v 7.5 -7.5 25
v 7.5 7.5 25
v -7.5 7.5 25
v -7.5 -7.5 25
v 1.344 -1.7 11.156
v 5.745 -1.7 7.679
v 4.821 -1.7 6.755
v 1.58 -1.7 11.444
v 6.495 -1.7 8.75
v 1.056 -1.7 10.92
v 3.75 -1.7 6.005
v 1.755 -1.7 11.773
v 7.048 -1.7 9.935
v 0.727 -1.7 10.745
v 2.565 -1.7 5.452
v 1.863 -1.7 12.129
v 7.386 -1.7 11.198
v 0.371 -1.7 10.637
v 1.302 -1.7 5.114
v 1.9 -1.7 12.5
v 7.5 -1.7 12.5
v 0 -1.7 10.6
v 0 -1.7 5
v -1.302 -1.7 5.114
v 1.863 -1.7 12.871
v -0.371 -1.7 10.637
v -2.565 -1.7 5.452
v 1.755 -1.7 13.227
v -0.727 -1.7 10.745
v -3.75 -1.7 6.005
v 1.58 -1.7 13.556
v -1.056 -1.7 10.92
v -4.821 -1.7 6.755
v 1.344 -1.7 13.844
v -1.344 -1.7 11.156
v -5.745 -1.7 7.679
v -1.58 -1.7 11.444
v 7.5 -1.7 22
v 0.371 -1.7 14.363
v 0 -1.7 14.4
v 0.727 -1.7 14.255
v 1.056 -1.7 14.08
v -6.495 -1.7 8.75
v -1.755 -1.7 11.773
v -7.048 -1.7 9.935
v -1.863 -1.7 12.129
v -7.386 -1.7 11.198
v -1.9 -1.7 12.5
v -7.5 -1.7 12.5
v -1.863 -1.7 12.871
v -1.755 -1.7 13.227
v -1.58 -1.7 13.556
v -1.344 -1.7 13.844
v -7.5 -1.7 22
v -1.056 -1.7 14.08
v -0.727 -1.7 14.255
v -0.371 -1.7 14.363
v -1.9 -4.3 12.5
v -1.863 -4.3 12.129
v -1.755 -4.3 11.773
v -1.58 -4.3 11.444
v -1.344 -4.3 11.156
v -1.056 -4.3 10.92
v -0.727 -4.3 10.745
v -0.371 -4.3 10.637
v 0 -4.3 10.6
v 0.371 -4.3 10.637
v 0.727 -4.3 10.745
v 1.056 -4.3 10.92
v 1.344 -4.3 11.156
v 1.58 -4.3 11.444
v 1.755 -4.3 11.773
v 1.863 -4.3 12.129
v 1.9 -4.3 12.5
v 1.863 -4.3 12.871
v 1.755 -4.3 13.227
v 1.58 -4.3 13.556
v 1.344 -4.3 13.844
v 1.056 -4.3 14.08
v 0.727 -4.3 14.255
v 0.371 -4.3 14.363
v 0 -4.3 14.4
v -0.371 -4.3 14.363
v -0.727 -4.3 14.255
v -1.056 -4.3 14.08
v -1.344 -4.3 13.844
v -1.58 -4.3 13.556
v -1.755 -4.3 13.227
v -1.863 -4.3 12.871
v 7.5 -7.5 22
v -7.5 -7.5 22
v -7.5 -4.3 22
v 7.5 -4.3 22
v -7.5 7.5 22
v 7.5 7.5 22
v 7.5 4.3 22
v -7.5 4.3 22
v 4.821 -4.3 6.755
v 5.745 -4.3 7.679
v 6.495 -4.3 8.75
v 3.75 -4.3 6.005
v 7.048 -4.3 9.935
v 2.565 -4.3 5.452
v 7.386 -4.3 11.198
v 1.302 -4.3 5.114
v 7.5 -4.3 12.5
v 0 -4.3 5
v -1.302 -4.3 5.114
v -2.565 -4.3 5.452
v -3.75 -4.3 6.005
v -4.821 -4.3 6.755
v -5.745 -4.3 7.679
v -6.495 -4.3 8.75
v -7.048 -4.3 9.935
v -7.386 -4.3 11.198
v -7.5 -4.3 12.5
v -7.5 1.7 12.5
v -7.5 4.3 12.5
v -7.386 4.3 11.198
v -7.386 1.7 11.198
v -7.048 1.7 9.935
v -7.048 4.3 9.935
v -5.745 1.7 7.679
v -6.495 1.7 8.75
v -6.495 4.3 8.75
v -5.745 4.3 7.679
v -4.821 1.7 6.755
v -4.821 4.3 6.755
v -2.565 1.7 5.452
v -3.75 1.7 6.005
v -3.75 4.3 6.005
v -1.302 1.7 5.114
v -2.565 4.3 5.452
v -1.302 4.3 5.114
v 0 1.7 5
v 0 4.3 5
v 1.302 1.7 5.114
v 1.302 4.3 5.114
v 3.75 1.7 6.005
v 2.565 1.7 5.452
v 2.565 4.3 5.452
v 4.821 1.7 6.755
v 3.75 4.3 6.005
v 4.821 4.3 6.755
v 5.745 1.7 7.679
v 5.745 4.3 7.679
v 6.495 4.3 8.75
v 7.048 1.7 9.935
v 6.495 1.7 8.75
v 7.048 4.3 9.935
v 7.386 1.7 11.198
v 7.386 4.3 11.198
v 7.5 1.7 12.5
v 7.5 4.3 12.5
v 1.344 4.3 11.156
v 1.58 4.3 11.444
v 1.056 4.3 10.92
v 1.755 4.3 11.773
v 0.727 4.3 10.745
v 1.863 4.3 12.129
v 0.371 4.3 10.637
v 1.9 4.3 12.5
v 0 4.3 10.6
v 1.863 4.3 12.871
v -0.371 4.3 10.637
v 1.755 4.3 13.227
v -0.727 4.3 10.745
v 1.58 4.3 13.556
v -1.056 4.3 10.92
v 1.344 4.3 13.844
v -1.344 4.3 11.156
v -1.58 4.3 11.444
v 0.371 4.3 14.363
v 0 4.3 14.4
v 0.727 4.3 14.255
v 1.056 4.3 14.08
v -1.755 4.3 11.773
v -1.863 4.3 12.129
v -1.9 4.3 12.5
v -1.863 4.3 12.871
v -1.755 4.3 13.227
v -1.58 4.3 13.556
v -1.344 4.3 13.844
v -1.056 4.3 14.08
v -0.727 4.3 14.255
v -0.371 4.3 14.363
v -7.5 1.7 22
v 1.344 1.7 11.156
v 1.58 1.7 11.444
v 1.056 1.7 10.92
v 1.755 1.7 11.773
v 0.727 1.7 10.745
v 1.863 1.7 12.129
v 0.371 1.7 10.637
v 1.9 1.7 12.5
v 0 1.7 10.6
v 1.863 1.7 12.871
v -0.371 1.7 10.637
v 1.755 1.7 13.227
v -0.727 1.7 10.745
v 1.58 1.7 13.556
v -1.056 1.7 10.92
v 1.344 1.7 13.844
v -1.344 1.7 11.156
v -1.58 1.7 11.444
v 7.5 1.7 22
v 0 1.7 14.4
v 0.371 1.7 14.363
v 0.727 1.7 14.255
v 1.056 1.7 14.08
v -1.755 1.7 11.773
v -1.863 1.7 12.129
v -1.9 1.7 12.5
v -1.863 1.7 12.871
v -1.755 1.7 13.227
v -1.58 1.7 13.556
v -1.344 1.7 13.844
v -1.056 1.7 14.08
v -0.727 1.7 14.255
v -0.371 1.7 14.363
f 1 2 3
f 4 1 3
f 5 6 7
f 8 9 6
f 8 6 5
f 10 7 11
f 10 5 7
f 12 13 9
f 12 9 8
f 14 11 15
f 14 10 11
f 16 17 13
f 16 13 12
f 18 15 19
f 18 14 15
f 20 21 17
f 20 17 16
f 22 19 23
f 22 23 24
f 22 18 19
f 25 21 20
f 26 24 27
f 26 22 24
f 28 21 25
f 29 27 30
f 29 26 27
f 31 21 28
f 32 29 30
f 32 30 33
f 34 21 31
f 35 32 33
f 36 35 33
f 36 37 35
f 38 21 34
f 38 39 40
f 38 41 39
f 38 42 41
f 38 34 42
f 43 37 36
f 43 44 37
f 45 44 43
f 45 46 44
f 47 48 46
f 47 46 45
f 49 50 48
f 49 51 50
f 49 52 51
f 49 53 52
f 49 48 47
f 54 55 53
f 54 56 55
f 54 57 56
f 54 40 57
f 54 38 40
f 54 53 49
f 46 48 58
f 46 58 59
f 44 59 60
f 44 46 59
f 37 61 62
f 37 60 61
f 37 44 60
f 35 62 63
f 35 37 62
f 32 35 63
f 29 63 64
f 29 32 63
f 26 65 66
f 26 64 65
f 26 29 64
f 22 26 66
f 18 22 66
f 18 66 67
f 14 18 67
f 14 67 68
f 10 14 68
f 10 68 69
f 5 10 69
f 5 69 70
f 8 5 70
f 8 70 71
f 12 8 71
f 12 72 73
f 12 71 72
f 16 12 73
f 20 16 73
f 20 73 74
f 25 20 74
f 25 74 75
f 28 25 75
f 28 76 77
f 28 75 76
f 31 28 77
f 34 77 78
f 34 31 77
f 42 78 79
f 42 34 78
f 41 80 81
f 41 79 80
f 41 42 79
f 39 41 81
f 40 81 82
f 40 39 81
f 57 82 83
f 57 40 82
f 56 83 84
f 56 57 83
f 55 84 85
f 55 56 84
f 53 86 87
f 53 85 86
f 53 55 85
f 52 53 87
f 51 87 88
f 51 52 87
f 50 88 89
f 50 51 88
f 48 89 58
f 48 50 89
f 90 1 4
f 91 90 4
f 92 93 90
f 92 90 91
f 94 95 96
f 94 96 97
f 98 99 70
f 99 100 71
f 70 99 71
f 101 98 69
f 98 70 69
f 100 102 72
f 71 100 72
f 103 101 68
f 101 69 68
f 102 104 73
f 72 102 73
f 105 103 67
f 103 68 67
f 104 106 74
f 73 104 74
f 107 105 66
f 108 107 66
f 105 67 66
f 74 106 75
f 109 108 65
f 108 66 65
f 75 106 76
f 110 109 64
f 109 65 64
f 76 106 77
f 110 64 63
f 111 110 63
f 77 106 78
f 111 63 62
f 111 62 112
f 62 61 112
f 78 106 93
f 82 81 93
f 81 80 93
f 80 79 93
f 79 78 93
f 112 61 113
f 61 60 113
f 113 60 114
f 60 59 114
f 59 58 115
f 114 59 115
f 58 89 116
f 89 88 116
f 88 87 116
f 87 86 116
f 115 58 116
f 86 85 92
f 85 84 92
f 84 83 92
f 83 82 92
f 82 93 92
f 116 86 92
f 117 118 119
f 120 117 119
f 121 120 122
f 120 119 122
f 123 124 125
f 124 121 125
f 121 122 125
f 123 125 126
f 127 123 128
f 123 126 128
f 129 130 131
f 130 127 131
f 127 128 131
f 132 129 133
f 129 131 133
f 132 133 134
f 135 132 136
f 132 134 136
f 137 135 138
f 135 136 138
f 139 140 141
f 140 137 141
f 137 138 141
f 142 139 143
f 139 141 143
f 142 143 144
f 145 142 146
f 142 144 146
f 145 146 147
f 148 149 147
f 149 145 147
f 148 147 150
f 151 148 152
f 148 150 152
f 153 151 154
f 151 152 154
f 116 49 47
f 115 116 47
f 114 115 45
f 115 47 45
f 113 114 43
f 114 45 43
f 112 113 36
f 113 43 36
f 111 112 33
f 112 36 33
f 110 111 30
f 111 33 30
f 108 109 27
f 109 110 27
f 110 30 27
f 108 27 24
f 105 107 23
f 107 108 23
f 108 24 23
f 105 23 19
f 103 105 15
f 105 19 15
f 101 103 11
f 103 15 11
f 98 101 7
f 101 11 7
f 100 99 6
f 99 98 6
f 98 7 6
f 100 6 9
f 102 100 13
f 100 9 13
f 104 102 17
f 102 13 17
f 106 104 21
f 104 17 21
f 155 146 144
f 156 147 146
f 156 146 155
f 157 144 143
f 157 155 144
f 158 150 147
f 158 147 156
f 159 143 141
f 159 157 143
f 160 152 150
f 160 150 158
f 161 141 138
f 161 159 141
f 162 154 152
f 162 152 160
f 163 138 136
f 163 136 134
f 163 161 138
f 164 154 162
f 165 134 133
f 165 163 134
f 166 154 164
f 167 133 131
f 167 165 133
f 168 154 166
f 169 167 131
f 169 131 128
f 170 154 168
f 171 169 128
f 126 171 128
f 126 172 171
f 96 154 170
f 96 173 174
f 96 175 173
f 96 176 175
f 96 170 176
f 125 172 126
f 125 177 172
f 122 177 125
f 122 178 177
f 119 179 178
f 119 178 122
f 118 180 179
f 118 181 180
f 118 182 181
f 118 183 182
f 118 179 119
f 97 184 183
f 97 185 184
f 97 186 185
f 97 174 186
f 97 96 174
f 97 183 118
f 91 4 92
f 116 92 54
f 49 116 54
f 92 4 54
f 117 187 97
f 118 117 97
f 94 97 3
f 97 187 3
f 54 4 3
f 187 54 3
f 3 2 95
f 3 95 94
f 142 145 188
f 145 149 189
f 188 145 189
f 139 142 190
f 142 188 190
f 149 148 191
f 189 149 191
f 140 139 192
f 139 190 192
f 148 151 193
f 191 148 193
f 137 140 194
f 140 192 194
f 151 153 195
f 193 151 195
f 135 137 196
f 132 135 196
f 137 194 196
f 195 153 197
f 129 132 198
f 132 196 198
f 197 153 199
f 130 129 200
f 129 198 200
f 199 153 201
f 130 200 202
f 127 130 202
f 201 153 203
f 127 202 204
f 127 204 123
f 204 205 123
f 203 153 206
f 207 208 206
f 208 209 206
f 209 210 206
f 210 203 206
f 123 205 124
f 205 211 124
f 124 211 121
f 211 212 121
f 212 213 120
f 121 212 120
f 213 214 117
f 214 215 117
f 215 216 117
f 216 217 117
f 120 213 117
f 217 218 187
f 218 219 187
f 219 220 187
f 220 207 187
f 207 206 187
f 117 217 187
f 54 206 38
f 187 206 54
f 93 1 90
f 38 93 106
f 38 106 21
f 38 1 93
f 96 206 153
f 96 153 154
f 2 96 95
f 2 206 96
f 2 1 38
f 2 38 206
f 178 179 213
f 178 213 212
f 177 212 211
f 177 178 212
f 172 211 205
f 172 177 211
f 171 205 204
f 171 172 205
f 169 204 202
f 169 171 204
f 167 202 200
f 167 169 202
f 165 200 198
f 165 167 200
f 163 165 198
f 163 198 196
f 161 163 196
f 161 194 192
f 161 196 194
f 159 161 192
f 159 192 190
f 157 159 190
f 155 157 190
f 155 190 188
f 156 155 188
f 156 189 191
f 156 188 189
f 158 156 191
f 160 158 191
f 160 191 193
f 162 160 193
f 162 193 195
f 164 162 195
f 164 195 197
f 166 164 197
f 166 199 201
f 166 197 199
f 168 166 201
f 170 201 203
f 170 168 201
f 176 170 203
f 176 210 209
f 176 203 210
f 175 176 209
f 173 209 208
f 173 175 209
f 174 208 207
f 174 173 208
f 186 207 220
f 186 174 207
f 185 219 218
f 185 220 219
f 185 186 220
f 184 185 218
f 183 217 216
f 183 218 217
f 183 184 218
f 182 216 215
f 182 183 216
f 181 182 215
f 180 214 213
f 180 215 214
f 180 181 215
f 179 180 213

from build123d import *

# Parameters (mm, degrees)
CYLINDER004_R        = 1.9
CYLINDER004_DEPTH    = 15
BOX005_W             = 15
BOX005_H             = 3.4
BOX005_DEPTH         = 17
ARRAY001_Y_COUNT     = 3
ARRAY001_Y_PITCH     = 6
CYLINDER003_R        = 7.5
CYLINDER003_DEPTH    = 15
BOX004_W             = 15
BOX004_H             = 15
BOX004_DEPTH         = 12.5
BODY_PLACEMENT_ANGLE = 180


with BuildPart() as side_2_bolt_hole:
    # Cylinder004 → Cylinder004 (new body)
    with BuildSketch(Plane(origin=(0, 7.5, 12.5), x_dir=(1, 0, 0), z_dir=(0, -1, 0))):
        Circle(CYLINDER004_R)
    extrude(amount=CYLINDER004_DEPTH)


with BuildPart() as side_2_extract_fusion:
    # Box005 → Box005 (new body)
    with BuildSketch(Plane(origin=(-7.5, -7.7, 3), x_dir=(1, 0, 0), z_dir=(0, 0, 1))):
        with Locations((7.5, 1.7)):
            Rectangle(BOX005_W, BOX005_H)
    extrude(amount=BOX005_DEPTH)

    # Array001 Y: side 2 extract fusion ×3


with BuildPart() as side_2_extract_fusion_1:
    add(side_2_extract_fusion.part)
    with Locations(*[(0, i * ARRAY001_Y_PITCH, 0) for i in range(1, ARRAY001_Y_COUNT)]):
        add(side_2_extract_fusion.part)

    # Fusion004: union side 2 bolt hole
    add(side_2_bolt_hole.part)


with BuildPart() as outer_cylinder001:
    # Cylinder003 → Cylinder003 (new body)
    with BuildSketch(Plane(origin=(0, 7.5, 12.5), x_dir=(1, 0, 0), z_dir=(0, -1, 0))):
        Circle(CYLINDER003_R)
    extrude(amount=CYLINDER003_DEPTH)


with BuildPart() as side_2_cut_clone:
    # Box004 → Box004 (new body)
    with BuildSketch(Plane(origin=(-7.5, -7.5, 0), x_dir=(1, 0, 0), z_dir=(0, 0, 1))):
        with Locations((7.5, 7.5)):
            Rectangle(BOX004_W, BOX004_H)
    extrude(amount=BOX004_DEPTH)

    # Fusion003: union outer cylinder001
    add(outer_cylinder001.part)

    # Cut001: cut side 2 extract fusion
    add(side_2_extract_fusion_1.part, mode=Mode.SUBTRACT)


with BuildPart() as side_2_cut_clone_1:
    # Body placement: moved
    add(side_2_cut_clone.part.moved(Location((0, 0, 25))).rotate(Axis((0, 0, 25), (0, 1, 0)), BODY_PLACEMENT_ANGLE))


solid = side_2_cut_clone_1.part
